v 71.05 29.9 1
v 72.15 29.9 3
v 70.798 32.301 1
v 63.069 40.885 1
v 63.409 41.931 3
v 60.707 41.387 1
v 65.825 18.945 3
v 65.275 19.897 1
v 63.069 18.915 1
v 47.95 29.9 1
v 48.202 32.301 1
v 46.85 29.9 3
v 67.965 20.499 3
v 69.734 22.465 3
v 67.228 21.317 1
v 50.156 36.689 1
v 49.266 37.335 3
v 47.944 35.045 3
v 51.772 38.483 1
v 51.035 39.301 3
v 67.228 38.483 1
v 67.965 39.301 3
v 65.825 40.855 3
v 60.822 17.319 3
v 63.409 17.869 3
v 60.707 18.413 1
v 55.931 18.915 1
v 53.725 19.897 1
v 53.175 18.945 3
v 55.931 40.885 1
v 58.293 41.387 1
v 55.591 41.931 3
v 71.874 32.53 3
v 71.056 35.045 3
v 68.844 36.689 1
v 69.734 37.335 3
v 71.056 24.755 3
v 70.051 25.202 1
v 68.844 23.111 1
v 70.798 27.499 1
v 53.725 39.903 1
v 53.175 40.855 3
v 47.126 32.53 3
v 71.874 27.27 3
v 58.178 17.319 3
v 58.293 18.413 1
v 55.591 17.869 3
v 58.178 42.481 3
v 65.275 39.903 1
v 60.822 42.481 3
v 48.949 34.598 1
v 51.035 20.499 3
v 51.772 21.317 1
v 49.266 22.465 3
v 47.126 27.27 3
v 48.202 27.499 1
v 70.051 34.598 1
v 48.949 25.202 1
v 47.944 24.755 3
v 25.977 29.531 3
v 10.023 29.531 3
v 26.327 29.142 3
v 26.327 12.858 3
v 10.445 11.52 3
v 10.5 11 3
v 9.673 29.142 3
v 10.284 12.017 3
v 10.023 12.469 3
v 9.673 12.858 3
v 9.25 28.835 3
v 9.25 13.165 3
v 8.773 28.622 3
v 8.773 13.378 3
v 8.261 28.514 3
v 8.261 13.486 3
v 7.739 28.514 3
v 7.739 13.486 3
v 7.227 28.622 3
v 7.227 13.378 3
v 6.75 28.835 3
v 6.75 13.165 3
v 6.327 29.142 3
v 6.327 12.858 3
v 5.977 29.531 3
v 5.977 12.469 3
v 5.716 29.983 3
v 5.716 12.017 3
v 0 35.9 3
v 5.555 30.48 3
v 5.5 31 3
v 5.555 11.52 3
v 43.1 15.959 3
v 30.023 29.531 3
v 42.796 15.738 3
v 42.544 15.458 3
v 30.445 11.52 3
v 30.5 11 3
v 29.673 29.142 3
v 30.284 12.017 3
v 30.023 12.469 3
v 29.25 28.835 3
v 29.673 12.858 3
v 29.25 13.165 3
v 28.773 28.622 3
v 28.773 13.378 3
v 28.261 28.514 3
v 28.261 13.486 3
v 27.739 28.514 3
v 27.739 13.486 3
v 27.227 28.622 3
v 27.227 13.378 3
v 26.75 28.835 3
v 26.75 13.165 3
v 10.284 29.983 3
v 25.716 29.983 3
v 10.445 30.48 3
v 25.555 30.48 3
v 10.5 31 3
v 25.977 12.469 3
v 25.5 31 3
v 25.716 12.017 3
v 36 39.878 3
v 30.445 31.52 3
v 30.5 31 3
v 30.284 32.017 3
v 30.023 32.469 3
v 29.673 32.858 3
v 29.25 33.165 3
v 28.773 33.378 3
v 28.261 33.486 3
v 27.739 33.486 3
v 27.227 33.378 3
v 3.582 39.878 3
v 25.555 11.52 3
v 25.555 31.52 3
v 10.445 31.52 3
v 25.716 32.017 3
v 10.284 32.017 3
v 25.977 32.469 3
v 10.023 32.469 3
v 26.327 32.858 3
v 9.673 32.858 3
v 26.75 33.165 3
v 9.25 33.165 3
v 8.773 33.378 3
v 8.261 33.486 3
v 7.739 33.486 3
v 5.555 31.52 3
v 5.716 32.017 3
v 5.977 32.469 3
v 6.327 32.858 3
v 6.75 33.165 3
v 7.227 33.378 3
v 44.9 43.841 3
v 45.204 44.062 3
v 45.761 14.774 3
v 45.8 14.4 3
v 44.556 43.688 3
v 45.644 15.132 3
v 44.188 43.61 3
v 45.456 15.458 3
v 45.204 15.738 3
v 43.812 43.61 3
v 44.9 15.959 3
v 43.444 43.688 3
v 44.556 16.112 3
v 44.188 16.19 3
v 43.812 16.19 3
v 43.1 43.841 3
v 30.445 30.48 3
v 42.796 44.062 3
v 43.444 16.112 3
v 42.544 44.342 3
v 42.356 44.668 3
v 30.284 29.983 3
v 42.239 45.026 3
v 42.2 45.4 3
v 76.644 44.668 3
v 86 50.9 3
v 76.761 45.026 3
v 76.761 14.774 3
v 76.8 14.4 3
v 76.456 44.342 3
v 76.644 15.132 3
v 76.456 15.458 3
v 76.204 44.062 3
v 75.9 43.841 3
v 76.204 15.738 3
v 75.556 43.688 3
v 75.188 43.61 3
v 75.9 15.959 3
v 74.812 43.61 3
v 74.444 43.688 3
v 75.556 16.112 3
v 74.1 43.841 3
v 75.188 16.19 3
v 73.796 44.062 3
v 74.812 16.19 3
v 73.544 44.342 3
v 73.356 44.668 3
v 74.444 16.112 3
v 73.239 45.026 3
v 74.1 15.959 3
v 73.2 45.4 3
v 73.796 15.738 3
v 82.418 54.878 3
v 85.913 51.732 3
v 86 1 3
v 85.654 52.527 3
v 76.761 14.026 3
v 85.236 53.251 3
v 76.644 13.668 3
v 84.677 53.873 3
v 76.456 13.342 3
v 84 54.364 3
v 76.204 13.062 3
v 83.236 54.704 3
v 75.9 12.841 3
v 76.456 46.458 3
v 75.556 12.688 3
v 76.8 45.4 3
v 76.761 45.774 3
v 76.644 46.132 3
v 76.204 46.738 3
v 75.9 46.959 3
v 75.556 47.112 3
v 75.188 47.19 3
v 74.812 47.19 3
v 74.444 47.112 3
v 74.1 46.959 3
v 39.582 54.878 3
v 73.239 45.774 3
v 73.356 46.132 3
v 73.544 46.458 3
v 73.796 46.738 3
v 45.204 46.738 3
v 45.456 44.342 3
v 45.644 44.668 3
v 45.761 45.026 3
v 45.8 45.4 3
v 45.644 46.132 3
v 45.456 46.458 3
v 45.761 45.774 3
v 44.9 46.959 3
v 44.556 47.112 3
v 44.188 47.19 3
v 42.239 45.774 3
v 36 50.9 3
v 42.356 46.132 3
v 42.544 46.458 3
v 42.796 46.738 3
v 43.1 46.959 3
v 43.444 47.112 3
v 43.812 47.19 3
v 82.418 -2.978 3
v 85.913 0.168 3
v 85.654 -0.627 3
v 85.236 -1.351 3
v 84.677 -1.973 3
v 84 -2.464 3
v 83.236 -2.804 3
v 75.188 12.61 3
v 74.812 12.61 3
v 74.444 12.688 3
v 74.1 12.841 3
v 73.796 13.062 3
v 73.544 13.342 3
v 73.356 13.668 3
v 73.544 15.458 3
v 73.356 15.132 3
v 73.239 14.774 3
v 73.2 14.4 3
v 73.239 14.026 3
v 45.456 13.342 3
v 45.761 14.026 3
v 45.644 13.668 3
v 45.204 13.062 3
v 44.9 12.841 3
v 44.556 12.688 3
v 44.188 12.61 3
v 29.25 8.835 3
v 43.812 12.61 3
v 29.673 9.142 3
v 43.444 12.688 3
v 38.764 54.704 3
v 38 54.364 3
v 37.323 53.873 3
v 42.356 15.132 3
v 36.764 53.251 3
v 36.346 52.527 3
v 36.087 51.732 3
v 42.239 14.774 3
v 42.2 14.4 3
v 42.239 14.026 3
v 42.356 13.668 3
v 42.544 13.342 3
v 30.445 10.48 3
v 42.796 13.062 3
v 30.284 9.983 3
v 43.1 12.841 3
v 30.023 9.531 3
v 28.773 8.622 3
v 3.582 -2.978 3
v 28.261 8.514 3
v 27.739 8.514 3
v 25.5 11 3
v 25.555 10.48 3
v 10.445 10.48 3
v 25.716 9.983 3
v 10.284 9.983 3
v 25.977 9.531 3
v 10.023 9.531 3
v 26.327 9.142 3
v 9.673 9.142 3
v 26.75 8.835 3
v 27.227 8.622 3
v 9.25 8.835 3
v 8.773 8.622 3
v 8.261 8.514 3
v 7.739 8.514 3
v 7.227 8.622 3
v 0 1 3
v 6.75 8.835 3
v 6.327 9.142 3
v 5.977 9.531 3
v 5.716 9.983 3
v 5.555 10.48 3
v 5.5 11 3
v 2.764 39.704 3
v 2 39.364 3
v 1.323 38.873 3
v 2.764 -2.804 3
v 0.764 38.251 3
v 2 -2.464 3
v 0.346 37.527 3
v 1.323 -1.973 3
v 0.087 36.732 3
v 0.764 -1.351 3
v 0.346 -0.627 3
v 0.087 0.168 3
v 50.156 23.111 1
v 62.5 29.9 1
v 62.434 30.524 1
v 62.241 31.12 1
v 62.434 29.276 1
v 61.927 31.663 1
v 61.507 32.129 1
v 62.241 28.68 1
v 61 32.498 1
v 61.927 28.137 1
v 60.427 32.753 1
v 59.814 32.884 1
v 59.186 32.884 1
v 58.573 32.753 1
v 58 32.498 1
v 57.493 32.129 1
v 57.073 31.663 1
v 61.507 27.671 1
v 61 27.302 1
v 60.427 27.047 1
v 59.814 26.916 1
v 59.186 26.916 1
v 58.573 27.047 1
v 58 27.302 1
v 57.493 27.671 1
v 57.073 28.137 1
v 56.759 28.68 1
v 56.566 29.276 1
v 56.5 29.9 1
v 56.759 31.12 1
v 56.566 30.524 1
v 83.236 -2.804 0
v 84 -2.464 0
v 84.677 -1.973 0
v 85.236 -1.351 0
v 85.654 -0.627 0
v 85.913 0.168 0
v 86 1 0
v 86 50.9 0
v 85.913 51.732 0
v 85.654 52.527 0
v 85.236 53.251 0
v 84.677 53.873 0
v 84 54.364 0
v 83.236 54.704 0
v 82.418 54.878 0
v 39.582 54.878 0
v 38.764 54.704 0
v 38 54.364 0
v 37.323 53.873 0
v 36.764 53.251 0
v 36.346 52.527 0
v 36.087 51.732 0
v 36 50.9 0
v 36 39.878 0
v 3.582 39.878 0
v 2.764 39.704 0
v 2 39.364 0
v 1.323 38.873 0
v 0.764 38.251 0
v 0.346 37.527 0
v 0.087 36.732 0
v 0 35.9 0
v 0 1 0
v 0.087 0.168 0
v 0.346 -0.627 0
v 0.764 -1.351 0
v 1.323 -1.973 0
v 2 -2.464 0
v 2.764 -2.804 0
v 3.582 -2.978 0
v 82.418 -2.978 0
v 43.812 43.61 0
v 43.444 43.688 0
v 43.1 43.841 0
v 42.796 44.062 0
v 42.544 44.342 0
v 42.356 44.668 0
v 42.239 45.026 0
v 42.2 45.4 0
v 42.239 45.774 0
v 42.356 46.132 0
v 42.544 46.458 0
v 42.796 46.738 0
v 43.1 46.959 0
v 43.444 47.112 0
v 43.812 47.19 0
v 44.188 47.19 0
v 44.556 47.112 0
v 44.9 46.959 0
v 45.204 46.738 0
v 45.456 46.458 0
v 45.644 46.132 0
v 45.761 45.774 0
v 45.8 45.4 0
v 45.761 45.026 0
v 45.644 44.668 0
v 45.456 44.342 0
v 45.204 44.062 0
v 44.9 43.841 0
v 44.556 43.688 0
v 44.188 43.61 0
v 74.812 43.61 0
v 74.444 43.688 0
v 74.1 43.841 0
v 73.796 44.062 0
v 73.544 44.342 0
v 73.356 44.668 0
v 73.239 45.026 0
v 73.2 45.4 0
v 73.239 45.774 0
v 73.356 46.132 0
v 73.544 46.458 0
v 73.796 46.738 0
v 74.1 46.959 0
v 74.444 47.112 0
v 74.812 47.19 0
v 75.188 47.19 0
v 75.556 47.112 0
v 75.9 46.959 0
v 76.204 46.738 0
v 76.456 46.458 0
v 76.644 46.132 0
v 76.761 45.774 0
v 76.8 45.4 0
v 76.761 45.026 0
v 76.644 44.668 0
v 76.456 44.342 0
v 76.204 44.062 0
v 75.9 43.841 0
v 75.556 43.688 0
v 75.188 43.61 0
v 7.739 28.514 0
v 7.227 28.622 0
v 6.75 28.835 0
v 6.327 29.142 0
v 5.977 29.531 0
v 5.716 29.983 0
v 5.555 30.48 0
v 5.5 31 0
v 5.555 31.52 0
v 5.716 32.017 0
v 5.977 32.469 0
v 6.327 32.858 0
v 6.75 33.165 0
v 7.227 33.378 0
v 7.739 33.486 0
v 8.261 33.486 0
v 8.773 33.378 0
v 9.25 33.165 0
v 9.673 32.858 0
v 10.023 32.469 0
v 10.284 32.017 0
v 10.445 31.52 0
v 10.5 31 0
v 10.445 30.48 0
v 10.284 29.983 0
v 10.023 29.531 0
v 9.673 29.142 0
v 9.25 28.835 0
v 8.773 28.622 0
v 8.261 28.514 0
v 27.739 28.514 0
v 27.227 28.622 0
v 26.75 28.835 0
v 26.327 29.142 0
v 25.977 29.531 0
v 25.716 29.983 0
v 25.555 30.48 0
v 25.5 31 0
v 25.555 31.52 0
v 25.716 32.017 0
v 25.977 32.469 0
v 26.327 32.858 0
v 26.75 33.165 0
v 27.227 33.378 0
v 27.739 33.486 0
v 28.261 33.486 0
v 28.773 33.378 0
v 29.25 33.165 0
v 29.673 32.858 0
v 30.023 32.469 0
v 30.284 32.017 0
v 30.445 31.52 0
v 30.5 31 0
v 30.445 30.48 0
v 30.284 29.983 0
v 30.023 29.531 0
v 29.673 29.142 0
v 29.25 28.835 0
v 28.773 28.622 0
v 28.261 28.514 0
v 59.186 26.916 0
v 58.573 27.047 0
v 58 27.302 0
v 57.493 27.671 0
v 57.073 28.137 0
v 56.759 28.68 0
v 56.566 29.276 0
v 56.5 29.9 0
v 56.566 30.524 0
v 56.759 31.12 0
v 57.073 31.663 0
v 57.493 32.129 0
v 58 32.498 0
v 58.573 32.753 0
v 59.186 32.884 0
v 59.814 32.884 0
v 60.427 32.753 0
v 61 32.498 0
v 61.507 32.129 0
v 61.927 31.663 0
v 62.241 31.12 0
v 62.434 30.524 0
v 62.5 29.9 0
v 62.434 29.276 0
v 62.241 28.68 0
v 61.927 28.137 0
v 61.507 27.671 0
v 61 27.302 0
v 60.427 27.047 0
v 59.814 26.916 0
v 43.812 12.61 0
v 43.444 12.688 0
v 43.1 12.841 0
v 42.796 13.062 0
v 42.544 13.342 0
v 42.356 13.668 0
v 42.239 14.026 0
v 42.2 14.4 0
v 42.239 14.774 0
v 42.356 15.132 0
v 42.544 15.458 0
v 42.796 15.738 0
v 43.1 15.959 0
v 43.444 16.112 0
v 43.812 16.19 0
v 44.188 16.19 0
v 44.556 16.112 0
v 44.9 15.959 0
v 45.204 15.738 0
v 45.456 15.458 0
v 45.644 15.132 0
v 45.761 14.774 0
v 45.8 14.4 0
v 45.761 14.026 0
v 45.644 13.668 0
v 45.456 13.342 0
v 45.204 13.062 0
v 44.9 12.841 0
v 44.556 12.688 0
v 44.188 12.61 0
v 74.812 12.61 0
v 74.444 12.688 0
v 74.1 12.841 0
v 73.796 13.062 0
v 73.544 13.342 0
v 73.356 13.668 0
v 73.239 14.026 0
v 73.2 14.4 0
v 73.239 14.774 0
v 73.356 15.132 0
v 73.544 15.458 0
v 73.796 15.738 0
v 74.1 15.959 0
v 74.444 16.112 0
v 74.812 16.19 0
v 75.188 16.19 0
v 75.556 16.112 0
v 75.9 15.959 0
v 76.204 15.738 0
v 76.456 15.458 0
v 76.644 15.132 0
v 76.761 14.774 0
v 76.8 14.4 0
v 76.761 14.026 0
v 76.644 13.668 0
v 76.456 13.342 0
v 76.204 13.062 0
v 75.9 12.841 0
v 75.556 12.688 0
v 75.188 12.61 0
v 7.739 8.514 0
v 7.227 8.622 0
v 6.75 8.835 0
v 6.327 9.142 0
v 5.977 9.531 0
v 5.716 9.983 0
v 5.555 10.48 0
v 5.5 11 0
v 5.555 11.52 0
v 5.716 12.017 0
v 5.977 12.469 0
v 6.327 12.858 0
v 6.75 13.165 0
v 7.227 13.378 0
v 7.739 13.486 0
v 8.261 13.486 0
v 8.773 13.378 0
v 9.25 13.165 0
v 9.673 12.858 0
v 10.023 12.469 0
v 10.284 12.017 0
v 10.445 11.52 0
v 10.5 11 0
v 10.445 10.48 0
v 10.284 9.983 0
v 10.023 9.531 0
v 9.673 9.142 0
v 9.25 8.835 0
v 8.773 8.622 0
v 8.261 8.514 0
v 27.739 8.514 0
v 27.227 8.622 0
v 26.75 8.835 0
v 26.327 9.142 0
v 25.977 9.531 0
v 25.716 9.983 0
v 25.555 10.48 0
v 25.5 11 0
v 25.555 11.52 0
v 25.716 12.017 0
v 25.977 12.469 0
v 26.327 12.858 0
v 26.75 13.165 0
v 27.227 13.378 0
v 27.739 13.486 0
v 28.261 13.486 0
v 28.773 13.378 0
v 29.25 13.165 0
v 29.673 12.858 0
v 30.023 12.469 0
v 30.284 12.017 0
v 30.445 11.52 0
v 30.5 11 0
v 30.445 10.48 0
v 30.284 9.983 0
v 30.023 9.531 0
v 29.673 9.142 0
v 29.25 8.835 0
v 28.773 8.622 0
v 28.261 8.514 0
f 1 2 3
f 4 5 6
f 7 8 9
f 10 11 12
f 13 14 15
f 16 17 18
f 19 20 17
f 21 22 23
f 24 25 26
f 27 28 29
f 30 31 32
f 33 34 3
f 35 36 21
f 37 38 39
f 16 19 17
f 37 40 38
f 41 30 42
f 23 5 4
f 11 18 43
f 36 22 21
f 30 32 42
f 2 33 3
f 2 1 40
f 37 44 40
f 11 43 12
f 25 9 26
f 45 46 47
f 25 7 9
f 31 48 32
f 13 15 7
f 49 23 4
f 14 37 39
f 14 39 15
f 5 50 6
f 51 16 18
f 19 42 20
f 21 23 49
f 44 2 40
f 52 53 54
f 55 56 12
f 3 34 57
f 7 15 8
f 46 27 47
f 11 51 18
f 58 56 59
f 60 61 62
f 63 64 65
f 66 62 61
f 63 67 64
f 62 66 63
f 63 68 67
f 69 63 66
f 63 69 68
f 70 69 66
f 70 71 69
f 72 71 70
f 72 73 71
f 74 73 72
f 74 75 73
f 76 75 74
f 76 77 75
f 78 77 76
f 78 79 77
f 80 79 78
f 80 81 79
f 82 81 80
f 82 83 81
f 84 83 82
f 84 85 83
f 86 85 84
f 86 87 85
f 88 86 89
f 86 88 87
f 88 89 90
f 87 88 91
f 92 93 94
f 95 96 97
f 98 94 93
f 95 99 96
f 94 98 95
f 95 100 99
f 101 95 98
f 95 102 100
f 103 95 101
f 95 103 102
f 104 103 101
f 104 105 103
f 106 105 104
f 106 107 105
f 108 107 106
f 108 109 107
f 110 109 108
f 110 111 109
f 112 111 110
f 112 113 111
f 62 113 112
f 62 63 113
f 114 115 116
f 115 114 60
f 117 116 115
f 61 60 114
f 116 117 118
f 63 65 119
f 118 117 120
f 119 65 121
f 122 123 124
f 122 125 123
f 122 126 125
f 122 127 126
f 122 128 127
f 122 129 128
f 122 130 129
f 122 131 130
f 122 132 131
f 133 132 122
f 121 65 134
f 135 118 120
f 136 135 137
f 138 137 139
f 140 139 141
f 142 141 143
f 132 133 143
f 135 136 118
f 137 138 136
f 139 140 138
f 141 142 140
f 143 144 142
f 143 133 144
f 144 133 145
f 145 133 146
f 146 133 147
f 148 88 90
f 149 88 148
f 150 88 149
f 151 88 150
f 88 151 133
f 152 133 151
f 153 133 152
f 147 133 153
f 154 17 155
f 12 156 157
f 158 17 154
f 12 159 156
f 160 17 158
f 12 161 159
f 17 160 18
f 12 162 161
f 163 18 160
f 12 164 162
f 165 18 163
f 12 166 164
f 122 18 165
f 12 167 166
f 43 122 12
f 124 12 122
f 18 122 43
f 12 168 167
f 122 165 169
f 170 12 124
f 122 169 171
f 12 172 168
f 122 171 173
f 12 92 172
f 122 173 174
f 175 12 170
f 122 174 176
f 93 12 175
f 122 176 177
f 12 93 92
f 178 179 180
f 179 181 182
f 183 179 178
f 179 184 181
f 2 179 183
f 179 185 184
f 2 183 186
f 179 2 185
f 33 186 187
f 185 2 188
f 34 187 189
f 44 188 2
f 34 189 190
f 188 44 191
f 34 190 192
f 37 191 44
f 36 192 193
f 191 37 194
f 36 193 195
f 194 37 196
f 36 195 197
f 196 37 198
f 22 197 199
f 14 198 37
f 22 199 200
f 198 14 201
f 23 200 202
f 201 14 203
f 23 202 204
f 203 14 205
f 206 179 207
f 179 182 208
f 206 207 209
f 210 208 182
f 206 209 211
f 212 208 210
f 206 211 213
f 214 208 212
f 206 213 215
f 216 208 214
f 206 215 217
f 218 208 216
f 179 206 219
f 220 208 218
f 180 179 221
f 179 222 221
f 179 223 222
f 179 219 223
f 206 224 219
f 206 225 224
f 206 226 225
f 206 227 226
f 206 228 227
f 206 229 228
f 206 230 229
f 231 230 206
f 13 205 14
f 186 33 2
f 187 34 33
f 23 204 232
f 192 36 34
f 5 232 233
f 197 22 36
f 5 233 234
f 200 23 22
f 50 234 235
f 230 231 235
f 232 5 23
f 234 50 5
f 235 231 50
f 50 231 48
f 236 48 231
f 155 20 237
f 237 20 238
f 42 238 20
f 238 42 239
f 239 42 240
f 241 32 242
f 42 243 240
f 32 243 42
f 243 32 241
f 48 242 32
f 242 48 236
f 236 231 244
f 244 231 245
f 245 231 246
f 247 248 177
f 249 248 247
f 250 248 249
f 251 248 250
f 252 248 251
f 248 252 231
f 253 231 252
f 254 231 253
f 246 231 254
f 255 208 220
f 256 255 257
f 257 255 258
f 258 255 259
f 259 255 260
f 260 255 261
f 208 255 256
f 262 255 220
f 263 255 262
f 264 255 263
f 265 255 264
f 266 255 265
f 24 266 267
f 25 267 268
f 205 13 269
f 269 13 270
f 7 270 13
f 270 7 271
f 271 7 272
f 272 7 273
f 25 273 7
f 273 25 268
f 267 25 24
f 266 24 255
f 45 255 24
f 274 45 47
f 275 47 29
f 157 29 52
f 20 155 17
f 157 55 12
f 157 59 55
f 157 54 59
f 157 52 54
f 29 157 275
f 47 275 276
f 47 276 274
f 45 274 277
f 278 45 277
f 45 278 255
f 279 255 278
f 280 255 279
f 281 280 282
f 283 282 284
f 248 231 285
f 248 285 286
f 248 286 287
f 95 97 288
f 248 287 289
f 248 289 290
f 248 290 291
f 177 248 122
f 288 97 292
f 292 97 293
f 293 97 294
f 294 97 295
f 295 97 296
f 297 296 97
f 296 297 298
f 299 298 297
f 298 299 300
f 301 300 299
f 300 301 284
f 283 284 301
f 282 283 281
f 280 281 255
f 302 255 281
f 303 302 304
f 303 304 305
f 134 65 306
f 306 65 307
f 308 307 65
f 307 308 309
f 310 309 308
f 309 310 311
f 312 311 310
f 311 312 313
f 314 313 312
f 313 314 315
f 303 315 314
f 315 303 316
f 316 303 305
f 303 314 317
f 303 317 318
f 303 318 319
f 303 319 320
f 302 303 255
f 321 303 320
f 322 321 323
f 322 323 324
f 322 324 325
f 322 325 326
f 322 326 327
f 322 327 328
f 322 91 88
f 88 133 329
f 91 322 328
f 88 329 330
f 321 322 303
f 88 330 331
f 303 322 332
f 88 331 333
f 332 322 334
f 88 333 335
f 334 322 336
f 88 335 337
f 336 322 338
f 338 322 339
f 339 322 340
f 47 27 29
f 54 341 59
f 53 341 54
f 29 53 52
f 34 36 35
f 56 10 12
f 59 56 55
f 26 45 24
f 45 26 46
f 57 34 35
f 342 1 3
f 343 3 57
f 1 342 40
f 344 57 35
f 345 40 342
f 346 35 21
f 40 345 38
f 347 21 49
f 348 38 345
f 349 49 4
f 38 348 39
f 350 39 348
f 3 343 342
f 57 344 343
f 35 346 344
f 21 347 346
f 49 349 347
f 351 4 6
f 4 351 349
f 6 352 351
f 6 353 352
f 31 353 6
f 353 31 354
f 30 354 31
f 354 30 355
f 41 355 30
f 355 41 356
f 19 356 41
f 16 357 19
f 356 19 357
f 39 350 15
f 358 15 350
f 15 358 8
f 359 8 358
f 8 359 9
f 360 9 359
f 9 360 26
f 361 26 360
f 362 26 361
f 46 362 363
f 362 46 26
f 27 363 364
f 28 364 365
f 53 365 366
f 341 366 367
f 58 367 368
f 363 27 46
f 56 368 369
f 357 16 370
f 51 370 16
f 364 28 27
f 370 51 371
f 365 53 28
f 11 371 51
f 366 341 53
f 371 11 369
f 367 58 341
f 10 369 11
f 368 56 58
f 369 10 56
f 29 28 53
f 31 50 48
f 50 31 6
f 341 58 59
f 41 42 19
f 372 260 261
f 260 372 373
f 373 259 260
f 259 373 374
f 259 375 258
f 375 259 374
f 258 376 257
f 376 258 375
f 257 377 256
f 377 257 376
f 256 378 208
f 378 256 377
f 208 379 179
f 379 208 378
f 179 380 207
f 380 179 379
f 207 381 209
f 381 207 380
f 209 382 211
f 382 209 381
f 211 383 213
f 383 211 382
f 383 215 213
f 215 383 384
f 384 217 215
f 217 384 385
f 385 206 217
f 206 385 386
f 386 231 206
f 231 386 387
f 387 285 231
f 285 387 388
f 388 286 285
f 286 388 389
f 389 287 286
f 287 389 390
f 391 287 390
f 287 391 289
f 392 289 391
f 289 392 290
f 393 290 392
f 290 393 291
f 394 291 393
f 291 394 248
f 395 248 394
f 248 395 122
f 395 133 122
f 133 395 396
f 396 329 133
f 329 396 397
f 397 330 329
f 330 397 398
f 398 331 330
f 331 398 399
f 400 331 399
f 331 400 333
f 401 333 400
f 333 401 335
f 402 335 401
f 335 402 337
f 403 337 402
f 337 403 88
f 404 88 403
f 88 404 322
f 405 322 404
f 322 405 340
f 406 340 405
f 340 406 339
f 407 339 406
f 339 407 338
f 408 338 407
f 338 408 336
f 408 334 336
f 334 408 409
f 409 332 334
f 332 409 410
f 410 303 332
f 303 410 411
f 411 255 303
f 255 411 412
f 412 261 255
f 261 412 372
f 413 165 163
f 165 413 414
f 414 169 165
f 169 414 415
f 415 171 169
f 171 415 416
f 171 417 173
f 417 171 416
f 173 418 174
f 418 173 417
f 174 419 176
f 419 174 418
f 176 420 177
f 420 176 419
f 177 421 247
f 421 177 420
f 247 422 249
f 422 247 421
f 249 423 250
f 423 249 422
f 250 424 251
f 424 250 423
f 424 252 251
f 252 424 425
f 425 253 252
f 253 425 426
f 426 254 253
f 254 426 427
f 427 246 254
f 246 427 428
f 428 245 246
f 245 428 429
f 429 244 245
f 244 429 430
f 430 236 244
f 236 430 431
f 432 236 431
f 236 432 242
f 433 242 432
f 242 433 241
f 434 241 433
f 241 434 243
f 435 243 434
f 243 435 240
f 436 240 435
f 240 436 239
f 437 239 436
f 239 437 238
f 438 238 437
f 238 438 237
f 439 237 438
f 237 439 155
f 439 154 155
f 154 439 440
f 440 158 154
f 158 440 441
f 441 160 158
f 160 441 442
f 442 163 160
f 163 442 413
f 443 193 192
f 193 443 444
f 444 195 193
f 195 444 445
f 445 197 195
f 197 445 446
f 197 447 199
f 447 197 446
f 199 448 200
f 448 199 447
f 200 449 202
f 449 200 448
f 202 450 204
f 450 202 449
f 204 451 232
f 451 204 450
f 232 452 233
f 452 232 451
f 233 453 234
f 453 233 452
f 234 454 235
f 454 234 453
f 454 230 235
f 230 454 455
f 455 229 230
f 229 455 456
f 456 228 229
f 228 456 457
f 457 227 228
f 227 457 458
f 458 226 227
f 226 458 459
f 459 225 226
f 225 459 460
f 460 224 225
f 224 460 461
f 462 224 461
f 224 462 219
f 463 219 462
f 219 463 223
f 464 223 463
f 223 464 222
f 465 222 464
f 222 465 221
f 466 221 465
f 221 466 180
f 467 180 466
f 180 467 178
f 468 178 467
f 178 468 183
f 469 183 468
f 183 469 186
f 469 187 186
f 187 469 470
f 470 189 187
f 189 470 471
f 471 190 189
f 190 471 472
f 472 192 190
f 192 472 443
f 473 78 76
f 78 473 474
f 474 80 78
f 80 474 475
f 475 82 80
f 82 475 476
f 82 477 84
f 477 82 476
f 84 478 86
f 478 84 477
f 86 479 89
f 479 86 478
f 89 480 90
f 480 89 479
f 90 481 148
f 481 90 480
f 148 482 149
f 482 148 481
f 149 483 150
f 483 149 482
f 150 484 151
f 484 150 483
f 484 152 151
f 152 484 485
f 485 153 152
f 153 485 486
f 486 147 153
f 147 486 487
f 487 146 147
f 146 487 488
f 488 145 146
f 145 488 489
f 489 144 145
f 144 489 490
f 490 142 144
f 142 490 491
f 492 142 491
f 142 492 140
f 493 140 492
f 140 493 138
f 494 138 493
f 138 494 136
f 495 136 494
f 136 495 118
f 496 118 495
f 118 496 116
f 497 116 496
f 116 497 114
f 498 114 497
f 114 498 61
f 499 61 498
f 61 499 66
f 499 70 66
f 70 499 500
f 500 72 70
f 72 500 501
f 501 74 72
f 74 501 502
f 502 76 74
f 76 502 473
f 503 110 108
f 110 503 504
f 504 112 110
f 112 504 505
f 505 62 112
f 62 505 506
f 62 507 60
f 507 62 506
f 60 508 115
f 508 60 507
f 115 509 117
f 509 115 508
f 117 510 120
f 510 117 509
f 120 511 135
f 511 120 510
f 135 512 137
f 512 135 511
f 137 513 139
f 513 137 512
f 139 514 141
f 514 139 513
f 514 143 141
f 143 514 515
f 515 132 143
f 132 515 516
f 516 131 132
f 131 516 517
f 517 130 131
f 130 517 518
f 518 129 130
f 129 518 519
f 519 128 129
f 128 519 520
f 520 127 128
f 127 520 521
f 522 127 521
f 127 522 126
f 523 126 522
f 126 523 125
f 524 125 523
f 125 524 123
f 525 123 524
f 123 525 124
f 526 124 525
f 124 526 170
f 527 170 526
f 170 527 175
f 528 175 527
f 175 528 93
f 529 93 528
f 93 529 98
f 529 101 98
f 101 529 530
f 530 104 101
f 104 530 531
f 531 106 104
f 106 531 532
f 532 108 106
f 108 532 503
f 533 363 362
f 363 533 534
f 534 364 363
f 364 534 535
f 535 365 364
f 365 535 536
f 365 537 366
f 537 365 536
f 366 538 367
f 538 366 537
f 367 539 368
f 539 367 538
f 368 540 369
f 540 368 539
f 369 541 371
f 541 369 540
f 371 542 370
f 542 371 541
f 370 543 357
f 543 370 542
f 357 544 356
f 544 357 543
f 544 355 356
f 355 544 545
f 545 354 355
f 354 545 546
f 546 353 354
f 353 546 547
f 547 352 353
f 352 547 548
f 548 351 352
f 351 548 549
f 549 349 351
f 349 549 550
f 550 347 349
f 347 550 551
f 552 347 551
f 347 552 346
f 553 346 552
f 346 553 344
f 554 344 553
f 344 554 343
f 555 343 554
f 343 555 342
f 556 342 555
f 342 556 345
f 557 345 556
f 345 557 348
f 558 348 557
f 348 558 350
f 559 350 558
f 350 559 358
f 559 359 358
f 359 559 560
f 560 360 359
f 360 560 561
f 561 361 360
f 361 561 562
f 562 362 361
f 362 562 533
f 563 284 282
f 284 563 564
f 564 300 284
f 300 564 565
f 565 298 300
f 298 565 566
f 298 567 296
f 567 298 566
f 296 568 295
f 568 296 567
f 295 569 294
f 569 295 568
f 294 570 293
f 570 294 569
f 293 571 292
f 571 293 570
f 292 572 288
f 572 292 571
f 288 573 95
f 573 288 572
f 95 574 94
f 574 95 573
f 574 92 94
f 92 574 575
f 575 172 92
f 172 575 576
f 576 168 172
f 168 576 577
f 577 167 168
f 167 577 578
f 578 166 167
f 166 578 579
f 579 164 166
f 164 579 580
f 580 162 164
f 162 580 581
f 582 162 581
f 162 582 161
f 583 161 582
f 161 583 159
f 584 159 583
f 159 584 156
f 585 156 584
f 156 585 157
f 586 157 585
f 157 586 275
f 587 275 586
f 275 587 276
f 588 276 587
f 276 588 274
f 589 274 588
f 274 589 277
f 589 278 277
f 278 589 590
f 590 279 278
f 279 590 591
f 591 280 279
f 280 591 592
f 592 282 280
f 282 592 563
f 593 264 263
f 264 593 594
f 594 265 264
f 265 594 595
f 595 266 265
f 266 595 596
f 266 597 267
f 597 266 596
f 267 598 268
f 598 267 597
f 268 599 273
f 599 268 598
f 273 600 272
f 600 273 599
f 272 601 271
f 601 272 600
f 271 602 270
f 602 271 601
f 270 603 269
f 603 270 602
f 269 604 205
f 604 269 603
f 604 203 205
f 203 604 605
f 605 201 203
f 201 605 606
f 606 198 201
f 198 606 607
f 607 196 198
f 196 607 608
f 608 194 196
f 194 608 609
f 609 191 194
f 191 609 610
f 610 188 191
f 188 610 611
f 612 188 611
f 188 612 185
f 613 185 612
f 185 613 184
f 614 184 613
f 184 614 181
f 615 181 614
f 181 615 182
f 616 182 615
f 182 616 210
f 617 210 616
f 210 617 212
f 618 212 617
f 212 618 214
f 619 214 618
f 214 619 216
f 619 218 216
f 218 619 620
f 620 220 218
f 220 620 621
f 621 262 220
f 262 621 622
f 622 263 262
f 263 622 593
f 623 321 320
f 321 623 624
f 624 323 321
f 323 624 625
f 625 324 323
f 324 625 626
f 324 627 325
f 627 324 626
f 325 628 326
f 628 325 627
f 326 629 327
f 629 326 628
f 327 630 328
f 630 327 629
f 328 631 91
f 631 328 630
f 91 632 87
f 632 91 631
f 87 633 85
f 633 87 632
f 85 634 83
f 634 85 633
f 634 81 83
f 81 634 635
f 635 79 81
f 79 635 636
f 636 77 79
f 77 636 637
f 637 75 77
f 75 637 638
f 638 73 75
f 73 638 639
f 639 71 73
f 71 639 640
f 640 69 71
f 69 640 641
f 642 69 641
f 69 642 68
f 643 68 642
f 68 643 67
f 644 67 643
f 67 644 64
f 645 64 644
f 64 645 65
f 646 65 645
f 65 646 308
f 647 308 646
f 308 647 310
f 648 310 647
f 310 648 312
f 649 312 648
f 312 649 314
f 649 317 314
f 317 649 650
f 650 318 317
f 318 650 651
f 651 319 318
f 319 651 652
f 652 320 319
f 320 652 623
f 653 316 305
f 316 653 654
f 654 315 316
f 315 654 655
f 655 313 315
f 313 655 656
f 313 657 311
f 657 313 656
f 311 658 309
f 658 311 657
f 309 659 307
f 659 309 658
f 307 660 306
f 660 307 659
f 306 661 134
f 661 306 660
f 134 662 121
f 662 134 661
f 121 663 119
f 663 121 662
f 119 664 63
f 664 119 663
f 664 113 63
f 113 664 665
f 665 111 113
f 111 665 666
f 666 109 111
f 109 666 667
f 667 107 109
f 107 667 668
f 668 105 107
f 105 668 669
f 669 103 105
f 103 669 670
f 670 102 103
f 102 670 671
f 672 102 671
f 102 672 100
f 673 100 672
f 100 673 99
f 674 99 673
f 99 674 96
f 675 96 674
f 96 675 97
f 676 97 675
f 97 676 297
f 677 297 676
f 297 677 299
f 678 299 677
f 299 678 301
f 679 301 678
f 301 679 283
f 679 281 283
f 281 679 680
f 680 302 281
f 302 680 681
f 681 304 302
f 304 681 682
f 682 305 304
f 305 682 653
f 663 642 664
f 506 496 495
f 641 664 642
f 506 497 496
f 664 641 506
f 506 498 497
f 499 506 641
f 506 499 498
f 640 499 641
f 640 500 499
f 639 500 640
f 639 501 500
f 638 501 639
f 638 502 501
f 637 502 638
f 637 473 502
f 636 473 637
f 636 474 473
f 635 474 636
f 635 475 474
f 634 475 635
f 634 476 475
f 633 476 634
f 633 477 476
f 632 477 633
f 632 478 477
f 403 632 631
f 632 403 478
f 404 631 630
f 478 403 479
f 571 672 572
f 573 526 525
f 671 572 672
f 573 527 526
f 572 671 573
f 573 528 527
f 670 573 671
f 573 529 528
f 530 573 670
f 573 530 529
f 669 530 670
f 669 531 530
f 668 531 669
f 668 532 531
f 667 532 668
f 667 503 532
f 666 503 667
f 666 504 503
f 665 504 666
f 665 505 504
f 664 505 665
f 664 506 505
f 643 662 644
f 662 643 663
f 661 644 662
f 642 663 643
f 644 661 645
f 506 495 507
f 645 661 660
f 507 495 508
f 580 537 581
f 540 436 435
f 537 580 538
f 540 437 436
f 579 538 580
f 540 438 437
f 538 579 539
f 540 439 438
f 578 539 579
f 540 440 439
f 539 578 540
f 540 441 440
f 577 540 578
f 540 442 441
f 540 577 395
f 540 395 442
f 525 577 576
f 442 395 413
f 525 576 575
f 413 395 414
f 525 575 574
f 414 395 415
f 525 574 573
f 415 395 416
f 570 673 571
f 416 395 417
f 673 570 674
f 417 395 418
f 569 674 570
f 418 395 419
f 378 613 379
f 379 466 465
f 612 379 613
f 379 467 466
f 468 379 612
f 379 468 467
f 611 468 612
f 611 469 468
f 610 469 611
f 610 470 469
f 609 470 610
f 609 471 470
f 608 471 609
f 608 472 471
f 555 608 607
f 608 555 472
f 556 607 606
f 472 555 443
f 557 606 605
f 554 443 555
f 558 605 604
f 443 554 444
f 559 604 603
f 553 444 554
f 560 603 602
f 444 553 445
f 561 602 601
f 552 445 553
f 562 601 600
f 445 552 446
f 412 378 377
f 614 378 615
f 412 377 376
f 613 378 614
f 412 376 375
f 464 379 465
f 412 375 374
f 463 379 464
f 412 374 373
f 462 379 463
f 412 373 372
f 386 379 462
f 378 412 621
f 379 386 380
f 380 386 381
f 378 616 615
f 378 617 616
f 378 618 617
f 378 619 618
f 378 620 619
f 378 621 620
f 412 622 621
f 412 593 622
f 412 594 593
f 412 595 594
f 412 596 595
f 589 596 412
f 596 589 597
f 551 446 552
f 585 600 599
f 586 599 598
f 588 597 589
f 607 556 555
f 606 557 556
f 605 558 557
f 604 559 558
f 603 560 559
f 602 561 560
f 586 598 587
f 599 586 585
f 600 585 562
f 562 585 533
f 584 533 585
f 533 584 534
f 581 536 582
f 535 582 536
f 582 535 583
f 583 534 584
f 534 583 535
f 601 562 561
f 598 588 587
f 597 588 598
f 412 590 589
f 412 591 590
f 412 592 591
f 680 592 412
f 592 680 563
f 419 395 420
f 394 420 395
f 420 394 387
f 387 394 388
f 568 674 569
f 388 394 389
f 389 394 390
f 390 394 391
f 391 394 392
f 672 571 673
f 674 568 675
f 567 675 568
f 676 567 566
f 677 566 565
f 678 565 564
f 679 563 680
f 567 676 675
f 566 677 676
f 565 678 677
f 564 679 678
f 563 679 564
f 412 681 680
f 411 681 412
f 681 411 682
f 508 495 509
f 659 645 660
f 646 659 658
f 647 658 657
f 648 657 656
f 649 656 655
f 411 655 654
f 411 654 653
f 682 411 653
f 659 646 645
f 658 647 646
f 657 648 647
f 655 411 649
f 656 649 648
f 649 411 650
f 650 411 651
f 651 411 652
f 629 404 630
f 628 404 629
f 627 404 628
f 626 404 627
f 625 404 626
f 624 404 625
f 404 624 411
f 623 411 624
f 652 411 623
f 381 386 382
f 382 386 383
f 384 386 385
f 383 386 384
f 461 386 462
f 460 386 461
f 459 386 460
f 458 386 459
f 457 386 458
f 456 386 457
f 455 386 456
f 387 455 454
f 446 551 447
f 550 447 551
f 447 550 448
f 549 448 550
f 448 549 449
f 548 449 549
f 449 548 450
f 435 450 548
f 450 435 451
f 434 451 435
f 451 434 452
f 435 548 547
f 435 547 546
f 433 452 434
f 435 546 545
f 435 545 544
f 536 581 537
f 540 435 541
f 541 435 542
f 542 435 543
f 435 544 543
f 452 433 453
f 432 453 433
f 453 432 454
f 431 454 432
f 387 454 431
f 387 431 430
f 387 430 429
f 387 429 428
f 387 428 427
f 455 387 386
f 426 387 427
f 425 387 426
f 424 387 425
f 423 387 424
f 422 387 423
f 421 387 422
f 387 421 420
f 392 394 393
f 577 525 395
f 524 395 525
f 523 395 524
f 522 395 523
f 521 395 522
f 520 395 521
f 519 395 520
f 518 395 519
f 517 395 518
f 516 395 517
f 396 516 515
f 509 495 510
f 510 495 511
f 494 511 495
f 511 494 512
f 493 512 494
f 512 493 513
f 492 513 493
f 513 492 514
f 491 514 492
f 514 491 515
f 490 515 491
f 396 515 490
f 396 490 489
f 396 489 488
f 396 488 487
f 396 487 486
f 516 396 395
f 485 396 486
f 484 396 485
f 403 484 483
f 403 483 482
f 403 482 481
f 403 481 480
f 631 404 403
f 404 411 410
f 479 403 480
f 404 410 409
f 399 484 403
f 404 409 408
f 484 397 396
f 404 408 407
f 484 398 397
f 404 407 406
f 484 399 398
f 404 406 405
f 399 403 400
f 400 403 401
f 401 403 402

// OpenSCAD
/**
 * End mount for NEMA-17 stepper motors on
 * OpenBuilds V-Slot linear extrusions.
 */


RAIL_WIDTH = 20.5;  // incl tolerance
CORNER_RADIUS = 4;
THICKNESS = 3;
$fn = 30;

SIDE_LENGTH = 83;
SIDE_LENGTH_HI = 47;
SIDE_LENGTH_LO = SIDE_LENGTH - SIDE_LENGTH_HI;
SIDE_HEIGHT_HI = 54.9;
SIDE_HEIGHT_LO = 39.9;

SHAFT_CENTER = [59.5, SIDE_HEIGHT_HI - 25];
SHAFT_DIAMETER = 6;
SHAFT_SCREW_OFFSET = 15.5;  // per axis
MOTOR_SCREW_DIAMETER = 3.6;
MOTOR_FLANGE_DIAMETER = 22;
MOTOR_FLANGE_DEPTH = 2;

RAIL_SCREW_DIAMETER = 5;
RAIL_SCREW_OFFSET = 20;  // per axis
RAIL_SCREW_LOWER_X = 8;
RAIL_SCREW_LOWER_Y = 11;
RAIL_SCREW_UPPER_Y = RAIL_SCREW_LOWER_Y + RAIL_SCREW_OFFSET;

/**
 * A square with rounded corners.
 *
 * @param {Vector[2]} size
 * @param {Number} radius_corner
 */
module RoundedSquare( size, radius_corner ) {
    translate([ radius_corner, radius_corner, 0 ])
        minkowski() {
            square([size[0] - 2*radius_corner, size[1] - 2*radius_corner]);
            circle(radius_corner);
        }
}

/**
 * 2D version of one side of the bracket.
 */
module Side2d()
{
    difference() {
        // Just the outer shape of the side
        translate([0, -THICKNESS])
        union() {
            RoundedSquare([SIDE_LENGTH, SIDE_HEIGHT_LO + THICKNESS], CORNER_RADIUS);
            translate([SIDE_LENGTH_LO, 0])
                RoundedSquare([SIDE_LENGTH_HI + THICKNESS, SIDE_HEIGHT_HI + THICKNESS], CORNER_RADIUS);
        }

        // The shaft
        translate(SHAFT_CENTER)
            circle(d=SHAFT_DIAMETER);

        // Four holes for the motor screws
        for (x = [-1 : 2 : 1]) {
            for (y = [-1 : 2 : 1]) {
                translate(SHAFT_CENTER + [x*SHAFT_SCREW_OFFSET, y*SHAFT_SCREW_OFFSET])
                    circle(d=MOTOR_SCREW_DIAMETER);
            }
        }

        // Four hole for fixture to the extrusions
        for (x = [0 : 1]) {
            for (y = [0 : 1]) {
                translate([RAIL_SCREW_LOWER_X + x*RAIL_SCREW_OFFSET, RAIL_SCREW_LOWER_Y + y*RAIL_SCREW_OFFSET])
                    circle(d=RAIL_SCREW_DIAMETER);
            }
        }
    }
}

module Block()
{
    difference() {
        linear_extrude(height=RAIL_WIDTH + 2*THICKNESS)
            Side2d();
        translate(SHAFT_CENTER) {
            cylinder(h = MOTOR_FLANGE_DEPTH, d2 = MOTOR_FLANGE_DIAMETER * 1.05, d1 = MOTOR_FLANGE_DIAMETER * 1.15);
            translate([0, 0, RAIL_WIDTH + 2*THICKNESS - MOTOR_FLANGE_DEPTH])
                cylinder(h = MOTOR_FLANGE_DEPTH, d1 = MOTOR_FLANGE_DIAMETER * 1.05, d2 = MOTOR_FLANGE_DIAMETER * 1.15);
        }
    }
}

module VSlotEndMount()
{
    color("DimGray")
    rotate([-90, 180, 0])
    translate([-2*RAIL_WIDTH, -RAIL_WIDTH, -RAIL_WIDTH/2])
        difference() {
            translate([0, 0, -THICKNESS])
            Block();

            // The "rail"
            cube([SIDE_LENGTH, SIDE_HEIGHT_HI, RAIL_WIDTH]);
        }
}

module SingleSide()
{
    translate([0, 0, -RAIL_WIDTH - THICKNESS])
    difference() {
        Block();
        translate([0, -THICKNESS, 0])
            cube([SIDE_LENGTH + THICKNESS, SIDE_HEIGHT_HI + THICKNESS, RAIL_WIDTH + THICKNESS]);
    }
}

// VSlotEndMount();
SingleSide();
